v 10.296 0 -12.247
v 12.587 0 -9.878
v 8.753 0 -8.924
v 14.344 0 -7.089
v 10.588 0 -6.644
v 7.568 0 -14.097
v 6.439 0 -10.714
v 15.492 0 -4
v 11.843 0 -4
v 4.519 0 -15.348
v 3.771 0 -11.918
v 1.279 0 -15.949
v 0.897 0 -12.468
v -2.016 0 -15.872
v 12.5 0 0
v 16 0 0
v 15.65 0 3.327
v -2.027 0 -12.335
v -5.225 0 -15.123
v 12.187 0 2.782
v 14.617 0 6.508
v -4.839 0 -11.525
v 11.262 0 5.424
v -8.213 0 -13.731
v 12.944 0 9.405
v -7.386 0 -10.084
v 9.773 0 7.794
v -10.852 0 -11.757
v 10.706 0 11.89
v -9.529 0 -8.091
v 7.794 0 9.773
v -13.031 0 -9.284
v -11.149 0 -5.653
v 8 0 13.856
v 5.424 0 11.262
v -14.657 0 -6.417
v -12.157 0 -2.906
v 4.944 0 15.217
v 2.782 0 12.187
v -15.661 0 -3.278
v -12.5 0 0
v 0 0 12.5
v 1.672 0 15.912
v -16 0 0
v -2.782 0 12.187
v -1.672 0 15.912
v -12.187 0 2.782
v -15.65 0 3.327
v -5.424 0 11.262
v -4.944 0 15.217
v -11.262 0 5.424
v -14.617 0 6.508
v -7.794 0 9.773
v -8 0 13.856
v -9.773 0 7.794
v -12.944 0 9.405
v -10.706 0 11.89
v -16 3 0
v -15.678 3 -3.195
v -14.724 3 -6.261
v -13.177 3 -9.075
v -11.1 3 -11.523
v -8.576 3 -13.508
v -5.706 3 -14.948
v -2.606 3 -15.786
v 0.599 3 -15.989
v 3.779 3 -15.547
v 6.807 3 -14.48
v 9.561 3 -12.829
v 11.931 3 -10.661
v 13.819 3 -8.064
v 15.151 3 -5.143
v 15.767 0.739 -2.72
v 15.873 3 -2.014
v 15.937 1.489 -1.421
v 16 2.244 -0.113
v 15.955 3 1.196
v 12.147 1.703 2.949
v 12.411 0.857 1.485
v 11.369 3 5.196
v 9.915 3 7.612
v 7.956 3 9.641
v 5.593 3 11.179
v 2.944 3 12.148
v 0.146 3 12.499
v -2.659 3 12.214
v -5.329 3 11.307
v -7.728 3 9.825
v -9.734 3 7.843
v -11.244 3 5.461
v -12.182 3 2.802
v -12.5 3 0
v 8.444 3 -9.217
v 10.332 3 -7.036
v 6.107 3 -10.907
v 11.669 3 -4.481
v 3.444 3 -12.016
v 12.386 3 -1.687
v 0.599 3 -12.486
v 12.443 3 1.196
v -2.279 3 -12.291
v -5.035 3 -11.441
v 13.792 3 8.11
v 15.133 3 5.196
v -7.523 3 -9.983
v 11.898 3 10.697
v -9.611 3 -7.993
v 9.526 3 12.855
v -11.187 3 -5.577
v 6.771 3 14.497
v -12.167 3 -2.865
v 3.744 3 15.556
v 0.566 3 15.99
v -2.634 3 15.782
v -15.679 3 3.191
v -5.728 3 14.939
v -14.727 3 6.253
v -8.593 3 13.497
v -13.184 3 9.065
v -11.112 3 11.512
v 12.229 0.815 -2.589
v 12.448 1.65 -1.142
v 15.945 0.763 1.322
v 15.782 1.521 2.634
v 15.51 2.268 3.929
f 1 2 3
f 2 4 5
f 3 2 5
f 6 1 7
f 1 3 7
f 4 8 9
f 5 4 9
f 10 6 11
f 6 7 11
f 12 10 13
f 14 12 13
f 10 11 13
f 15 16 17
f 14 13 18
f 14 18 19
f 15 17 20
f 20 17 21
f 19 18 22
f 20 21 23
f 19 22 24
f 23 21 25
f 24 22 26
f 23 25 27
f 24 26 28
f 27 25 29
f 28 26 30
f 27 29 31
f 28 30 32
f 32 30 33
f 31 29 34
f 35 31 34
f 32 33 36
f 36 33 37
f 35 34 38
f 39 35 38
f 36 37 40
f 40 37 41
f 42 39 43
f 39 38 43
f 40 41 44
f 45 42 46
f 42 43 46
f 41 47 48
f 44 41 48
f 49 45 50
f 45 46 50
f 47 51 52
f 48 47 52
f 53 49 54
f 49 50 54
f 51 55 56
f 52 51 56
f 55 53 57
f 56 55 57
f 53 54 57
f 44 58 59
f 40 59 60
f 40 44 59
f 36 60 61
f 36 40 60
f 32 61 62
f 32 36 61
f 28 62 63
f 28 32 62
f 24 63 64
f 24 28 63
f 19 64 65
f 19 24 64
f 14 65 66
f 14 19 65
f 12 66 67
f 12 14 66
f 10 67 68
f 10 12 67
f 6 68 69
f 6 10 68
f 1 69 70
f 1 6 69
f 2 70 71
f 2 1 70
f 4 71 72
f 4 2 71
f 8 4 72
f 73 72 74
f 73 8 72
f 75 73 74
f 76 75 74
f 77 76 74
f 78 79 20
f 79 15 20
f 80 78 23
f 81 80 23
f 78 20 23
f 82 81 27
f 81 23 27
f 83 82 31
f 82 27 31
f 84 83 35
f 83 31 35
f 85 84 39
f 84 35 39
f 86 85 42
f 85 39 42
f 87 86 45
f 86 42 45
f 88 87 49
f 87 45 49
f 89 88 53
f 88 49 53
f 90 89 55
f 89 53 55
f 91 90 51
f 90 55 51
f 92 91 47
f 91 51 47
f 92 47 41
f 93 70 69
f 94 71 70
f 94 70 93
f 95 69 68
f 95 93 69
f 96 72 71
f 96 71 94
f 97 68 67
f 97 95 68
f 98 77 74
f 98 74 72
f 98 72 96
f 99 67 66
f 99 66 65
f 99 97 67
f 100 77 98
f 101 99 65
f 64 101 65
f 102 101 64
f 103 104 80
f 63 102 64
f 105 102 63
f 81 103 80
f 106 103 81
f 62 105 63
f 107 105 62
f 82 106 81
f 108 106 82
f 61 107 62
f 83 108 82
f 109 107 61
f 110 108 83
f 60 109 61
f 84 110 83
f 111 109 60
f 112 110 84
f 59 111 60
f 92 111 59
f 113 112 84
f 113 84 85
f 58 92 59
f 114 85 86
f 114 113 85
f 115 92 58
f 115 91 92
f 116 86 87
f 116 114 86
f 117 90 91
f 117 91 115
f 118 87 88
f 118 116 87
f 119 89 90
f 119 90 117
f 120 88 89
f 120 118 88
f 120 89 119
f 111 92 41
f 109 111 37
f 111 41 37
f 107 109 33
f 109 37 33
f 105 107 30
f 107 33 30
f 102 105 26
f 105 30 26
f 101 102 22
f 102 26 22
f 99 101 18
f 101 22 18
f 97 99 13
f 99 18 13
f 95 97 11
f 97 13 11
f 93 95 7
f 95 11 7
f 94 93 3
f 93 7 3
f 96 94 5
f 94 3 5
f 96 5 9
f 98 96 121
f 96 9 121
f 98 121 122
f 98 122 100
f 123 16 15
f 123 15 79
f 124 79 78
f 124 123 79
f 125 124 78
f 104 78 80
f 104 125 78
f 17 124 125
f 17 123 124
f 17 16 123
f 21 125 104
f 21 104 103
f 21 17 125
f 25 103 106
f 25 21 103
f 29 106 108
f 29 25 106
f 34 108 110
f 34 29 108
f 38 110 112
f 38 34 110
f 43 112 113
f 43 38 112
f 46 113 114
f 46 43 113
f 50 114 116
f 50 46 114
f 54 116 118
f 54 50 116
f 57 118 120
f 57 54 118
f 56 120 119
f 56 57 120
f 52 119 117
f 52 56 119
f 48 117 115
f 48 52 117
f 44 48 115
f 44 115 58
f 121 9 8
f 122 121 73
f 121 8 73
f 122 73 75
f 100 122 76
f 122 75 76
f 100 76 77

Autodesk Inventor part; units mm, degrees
ref_plane "XZ Plane" through (0, 0, 0) normal (0, 1, 0) x (-1, 0, 0)
ref_plane "XY Plane" through (0, 0, 0) normal (0, 0, 1) x (1, 0, 0)
sketch "Sketch1" plane through (0, 0, 0) normal (0, 1, 0) x (-1, 0, 0)
  circle A0 centre (0, 0) radius 16
  circle A1 centre (0, 0) radius 12.5
  dimension "d0" = 32
  dimension "d1" = 25
extrude "Extrusion1" add sketch "Sketch1" along normal blind 3
ref_plane "Work Plane1" through (16.25, 0, 0) normal (1, 0, 0) x (0, 1, 0)
sketch "Sketch2" plane through (16.25, 0, 0) normal (1, 0, 0) x (0, 1, 0)
  line L0 (0, 0) -> (3, 5.1962)
  line L1 (3, -16) -> (3, 16) projected
  line L2 (0, -12.5) -> (0, 12.5) projected
  line L3 (0, 0) -> (0, -4)
  line L4 (0, 16) -> (0, -16) projected
  line L5 (0, -4) -> (3, 1.1962)
  line L6 (3, 5.1962) -> (3, 1.1962)
  dimension "d10" = 2
  dimension "d11" = 30
extrude "Extrusion2" cut sketch "Sketch2" against normal blind 9
properties part number "PistonRing" material "Stainless Steel"
